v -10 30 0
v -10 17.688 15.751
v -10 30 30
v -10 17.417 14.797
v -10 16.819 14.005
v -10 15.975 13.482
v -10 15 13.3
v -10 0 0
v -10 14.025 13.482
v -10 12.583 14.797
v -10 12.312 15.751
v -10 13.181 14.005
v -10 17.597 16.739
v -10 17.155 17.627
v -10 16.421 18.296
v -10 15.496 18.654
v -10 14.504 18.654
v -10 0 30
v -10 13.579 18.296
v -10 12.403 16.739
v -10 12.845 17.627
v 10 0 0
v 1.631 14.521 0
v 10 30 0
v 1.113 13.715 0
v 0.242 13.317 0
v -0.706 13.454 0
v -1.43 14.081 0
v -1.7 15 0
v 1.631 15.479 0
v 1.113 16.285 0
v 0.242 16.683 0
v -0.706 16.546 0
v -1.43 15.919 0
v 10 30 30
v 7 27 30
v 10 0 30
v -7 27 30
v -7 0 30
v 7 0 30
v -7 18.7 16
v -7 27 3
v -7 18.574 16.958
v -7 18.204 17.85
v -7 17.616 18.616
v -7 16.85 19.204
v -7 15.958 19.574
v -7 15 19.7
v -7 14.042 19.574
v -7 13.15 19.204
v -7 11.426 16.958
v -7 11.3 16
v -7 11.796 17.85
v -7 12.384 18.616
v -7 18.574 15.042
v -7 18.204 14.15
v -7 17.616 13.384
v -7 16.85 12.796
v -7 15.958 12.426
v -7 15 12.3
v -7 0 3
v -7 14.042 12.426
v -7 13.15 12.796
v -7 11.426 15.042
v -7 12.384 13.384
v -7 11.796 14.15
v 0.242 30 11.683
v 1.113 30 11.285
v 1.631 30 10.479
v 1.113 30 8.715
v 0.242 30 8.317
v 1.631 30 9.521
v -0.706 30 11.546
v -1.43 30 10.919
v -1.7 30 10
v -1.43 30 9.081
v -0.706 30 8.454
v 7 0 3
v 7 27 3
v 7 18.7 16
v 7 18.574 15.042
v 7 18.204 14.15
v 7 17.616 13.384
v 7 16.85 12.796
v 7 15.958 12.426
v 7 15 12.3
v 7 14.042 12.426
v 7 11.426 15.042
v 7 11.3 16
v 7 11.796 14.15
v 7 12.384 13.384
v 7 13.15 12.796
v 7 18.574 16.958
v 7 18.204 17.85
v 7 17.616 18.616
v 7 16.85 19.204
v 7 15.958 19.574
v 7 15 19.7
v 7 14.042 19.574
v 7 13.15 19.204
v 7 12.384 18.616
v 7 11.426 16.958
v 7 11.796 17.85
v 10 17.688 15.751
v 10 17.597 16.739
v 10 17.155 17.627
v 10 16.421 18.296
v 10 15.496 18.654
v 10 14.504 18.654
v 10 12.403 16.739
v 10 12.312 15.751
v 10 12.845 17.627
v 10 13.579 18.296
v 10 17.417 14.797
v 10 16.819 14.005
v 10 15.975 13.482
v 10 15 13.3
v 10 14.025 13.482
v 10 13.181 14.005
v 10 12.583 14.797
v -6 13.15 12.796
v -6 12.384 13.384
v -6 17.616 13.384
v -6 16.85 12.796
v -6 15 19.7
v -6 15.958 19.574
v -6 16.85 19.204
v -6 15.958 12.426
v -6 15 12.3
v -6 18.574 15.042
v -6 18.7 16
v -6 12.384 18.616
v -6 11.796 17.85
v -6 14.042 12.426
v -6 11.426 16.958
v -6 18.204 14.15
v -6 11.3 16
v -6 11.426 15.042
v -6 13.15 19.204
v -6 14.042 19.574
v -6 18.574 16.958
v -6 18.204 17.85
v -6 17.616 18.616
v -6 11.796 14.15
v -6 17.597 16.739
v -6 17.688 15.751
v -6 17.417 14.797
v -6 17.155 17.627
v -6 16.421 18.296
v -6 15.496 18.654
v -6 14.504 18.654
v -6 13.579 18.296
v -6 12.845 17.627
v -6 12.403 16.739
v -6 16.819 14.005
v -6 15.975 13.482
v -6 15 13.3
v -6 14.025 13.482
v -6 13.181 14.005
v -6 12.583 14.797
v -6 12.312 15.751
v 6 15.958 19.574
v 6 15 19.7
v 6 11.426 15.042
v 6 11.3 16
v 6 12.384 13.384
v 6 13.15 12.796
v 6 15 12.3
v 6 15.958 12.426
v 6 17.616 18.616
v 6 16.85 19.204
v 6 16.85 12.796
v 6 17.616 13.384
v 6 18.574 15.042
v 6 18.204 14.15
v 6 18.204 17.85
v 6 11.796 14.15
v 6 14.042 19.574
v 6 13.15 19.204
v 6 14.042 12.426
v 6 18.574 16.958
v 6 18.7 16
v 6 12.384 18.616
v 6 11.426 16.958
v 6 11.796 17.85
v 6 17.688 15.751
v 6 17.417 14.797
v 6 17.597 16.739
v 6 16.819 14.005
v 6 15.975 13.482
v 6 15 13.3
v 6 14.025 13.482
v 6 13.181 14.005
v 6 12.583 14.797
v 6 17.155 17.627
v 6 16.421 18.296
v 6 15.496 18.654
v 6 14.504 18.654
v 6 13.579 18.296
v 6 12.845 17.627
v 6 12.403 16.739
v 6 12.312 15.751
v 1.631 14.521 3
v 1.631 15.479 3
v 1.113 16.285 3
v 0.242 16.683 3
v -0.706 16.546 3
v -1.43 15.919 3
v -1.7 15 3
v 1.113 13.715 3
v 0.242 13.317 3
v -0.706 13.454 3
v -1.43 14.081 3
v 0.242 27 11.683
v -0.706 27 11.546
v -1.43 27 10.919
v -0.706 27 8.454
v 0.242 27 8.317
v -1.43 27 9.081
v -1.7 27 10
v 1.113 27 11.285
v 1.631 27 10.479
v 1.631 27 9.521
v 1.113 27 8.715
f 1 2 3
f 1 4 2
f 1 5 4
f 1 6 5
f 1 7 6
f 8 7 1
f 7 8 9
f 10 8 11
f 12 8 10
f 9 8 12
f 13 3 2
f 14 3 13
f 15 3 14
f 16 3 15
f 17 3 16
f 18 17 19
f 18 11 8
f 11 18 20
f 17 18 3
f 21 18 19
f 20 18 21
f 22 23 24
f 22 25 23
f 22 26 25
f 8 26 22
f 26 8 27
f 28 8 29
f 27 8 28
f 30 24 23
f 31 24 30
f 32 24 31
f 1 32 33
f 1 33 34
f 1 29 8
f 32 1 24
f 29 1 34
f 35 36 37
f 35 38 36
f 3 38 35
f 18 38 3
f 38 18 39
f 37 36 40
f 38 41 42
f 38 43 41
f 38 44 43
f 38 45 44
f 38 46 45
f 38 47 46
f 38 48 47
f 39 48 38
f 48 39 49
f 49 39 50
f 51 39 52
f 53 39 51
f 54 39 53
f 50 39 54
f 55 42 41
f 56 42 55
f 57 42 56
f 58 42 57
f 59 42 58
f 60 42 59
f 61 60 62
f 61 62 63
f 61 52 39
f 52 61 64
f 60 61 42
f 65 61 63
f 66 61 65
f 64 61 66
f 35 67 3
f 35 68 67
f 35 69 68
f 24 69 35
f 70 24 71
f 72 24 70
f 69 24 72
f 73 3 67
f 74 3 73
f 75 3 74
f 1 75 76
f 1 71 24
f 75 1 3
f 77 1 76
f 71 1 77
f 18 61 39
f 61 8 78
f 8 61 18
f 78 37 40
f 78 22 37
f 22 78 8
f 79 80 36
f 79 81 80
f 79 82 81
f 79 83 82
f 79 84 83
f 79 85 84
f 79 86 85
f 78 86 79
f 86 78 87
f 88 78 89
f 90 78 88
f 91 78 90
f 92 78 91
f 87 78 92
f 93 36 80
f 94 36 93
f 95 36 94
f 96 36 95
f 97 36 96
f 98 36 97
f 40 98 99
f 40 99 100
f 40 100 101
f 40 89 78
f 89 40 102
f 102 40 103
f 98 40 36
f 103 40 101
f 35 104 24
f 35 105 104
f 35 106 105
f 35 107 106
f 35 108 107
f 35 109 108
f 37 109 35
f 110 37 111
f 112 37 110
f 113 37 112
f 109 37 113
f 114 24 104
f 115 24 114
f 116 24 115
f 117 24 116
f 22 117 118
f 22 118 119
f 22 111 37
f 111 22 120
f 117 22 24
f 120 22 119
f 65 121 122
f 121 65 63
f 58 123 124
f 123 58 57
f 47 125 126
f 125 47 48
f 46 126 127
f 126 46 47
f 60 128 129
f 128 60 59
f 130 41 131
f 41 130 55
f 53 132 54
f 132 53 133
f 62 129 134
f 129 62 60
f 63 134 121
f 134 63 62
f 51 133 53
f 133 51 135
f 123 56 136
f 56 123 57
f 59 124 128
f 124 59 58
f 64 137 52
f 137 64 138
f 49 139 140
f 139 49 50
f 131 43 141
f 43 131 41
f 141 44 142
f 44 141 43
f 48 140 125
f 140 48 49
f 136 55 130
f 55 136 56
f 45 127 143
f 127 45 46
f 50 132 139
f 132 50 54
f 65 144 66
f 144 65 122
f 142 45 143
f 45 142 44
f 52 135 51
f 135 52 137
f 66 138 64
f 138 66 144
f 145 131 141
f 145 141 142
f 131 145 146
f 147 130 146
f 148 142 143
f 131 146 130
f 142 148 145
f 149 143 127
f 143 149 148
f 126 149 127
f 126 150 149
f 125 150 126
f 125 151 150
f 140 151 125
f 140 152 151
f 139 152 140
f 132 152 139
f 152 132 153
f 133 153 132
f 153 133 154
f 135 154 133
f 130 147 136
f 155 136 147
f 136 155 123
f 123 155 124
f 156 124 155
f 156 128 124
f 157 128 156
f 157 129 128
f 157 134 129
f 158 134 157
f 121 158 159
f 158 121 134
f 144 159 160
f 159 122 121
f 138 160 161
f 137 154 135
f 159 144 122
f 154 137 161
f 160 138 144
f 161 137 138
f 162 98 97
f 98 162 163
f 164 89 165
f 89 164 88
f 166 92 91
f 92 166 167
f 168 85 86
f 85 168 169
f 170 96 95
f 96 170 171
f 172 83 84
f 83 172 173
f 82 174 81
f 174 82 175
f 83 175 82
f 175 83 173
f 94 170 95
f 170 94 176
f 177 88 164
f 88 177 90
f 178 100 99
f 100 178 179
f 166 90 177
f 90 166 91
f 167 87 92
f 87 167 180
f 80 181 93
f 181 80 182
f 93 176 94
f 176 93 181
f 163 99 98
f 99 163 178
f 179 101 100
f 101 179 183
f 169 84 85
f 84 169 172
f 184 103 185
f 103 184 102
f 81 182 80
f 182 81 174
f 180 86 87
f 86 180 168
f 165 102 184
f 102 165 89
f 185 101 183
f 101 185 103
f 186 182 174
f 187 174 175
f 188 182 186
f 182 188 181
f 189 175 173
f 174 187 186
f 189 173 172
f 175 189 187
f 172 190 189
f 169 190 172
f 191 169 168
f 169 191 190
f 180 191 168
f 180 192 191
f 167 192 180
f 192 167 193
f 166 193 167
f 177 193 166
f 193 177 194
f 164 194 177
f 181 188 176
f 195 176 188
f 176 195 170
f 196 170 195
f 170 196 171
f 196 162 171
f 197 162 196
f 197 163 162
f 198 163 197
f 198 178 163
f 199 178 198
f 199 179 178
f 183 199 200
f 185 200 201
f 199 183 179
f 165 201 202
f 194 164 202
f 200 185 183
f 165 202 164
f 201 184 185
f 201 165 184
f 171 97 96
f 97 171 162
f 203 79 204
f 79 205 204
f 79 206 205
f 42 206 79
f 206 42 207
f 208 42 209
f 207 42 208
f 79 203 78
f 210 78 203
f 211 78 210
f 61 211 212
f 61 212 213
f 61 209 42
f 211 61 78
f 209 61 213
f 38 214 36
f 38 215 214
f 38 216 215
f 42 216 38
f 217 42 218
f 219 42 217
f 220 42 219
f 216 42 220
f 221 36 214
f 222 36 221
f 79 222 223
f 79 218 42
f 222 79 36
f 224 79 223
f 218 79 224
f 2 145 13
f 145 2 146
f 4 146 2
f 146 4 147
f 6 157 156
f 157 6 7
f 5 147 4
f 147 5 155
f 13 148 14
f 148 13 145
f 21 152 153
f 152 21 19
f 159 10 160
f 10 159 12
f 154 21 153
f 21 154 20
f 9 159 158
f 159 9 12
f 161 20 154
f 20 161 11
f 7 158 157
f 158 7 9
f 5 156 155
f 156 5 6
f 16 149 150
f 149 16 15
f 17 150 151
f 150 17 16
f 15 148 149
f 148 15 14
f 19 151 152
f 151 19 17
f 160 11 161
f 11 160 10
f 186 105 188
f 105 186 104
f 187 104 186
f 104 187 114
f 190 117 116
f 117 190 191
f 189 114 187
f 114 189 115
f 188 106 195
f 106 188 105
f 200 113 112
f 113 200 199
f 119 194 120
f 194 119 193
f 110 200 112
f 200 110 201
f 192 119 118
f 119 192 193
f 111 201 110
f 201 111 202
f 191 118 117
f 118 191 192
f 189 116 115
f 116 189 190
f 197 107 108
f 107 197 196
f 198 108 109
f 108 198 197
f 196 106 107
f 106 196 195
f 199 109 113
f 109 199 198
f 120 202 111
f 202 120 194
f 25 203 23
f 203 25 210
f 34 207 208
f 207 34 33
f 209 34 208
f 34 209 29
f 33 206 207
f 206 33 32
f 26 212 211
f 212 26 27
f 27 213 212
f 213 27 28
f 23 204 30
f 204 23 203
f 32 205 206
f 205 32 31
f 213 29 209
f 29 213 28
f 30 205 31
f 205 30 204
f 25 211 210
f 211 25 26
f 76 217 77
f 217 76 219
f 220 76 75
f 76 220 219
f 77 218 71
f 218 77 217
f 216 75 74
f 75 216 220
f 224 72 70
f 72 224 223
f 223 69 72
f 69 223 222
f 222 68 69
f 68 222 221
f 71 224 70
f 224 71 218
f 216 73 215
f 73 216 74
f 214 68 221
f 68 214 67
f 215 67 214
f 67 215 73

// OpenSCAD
// file: beltclamp.scad
// PRUSA Mendel  
// Belt clamp
// GNU GPL v3
// Josef Průša
// josefprusa@me.com
// prusadjs.cz
// http://www.reprap.org/wiki/Prusa_Mendel
// http://github.com/prusajr/PrusaMendel
//
// modified by neurofun

include<config.scad>;

module beltclamp(clamp_length=32){

clamp_height = 3;
clamp_width = 9;
belt_pitch = 2;
belt_width = 6.5;
tooth_width = 1.3;
tooth_heigth = .75;
offset = belt_pitch/4;
// uncomment next line for a symetric clamp
//offset = 0;

	difference(){
		// basic shape
		union(0){
			translate(v = [0,0,clamp_height/2]) cube([clamp_length,clamp_width,clamp_height], center=true);
			translate(v = [-clamp_length/2, 0, 0]) cylinder(r=clamp_width/2,h=clamp_height);
			translate(v = [clamp_length/2, 0, 0]) cylinder(r=clamp_width/2,h=clamp_height);
			}
		// screw holes
		translate(v = [-clamp_length/2, 0, -1])cylinder(r=3/2+play*2, h=clamp_height+2,$fn=20);
		translate(v = [ clamp_length/2, 0, -1])cylinder(r=3/2+play*2, h=clamp_height+2,$fn=20);
		// belt grip
		translate(v = [0,offset,clamp_height-tooth_heigth])
		for ( i = [round(-clamp_width/belt_pitch/2) : round(clamp_width/belt_pitch/2)]){
			translate(v = [0,belt_pitch*i,tooth_heigth])cube(size = [belt_width, tooth_width, tooth_heigth*2], center = true);
		}
	}

}

beltclamp();
// file: spacer.scad
include <config.scad>;

module spacer(od,id,h)
{
    difference()
    {
        cylinder(h=h,d=od,center=true);
        cylinder(h=h+2,d=id,center=true);
    }
}


spacer(7,5+2*play,(20+4-8.8)/2); 
translate([0,0,-0.8/2])
    spacer(10,5+2*play,(20+4-8.8)/2-0.8); 
// file: roller.scad
include <config.scad>;


module roller()
{
    difference()
    {
        union()
        {
            resize([19,19,6])
                sphere(d=1);
            translate([0,0,-3])
                cylinder(h=10,d=8);
        }
        translate([0,0,-4])
            cylinder(h=12,d=5);
    }
}

module vroller()
{
    color([0.3,0.3,0.3,1])
    difference()
    {
        union()
        {
            rotate_extrude(convexity =100)
            {
                translate([0,-5.78/2])
                    square([15.23/2,5.78]);

                translate([0,-8.8/2])
                    square([12.21/2,8.8]);
                
                translate([12.21/2,-8.8/2])
                rotate([0,0,45])
                    square([sqrt(pow((8.8-5.78)/2,2)
                        +pow((8.8-5.78)/2,2)),3]);
                translate([15.23/2,5.78/2])
                rotate([0,0,180-45])
                    square([sqrt(pow((8.8-5.78)/2,2)
                        +pow((8.8-5.78)/2,2)),3]);
            }
            
            cylinder(h=9,d=10,center=true);
        }

        cylinder(h=10.8,d=5,center=true);
    }
}


vroller();
// file: corner.scad
include<config.scad>

module corner(h1=10,h2=10,d1=3+play,d2=3+play,s1=0,s2=0,)
{
    translate([0,-h1-s1,-h2-s2])
    difference()
    {
        union()
        {
            translate([-10,0,0])
            {
                cube([20,h1*2,3]);
                cube([20,3,h2*2]);
            }
            
            for(d=[1,-1])
            translate([-3/2+d*(10-3/2),0,0])
                cube([3,h1*2,h2*2]);
        }
        
        translate([-11,h1*2,0])
        rotate([atan(h1/h2),0,0])
            cube([22,sqrt(h1*h1+h2*h2),sqrt(h1*h1+h2*h2)*2]);
        
        //hole
        translate([0,h1+s1,-1])
            cylinder(h=5,d=d1);
        translate([0,4,h2+s2])
        rotate([90,0,0])
            cylinder(h=5,d=d2);
    }    
}

module corner2()
{
    translate([0,-10,0])
    rotate([0,0,180])
    translate([0,10,10])
        corner();
    translate([0,10,0])
    translate([0,10,10])
        corner();
}


corner();
// file: rpvxy.scad
include <config.scad>;
use <corner.scad>;
use <roller.scad>;
use <slot.scad>;
use <spacer.scad>;
use <nema.scad>;
use <beltclamp.scad>;

d_roller=(31.9+31)/2;


module rpvxy_plate()
{
    difference()
    {
        union()
        {
            translate([0,+27/2,-34-3/2])
                cube([d_roller+20,60+27,3],center=true);
        }
        
        for(dx=[1,-1])
        for(dy=[1,-1])
        translate([dx*d_roller/2,dy*(60+27-20)/2+27/2,-34-4])
            cylinder(h=5,d=3+play);
        for(d=[1,-1])
        translate([d*32/2,+27/2,-34-4])
            cylinder(h=5,d=3+play);

        for(dx=[1,-1])
        for(dy=[1,-1])
        translate([dx*32/2,dy*27/2+27/2,-34-4])
            cylinder(h=5,d=6+play);
    }    
}

module rpvxy_joiner()
{
    difference()
    {
        union()
        {
            translate([0,+27/2,-10-3/2])
                cube([9,27+20,3],center=true);
            
            translate([0,27/2,-10-(20+4-8.8)/2])
                cylinder(h=(20+4-8.8)/2,d=7);
        }
        
        for(dy=[0,27])
        translate([0,dy,-10-4])
            cylinder(h=5,d=3+play);

        translate([0,+27/2,-10-10])
            cylinder(h=11,d=3+play);
    }    
}


//Roller + corner
module rpvxy(motor=true,debug=false,print=false)
rotate([0,print?(motor?1:-1)*90:0,0])
{
    if(print==false)
    for(d1=[1,-1])
    for(d2=[1,-1,0])
    translate([d1*d_roller/2,d2*(60+27-20)/2+27/2,-20-2])
    {
        if(d2==-1)
        translate([0,0,22])
        rotate([0,0,-90*d2+90])
            corner(h1=10,h2=10,
                d1=3+play,d2=3+play);
        
        for(d=[1,-1])
        if(d2!=0 || d!=1)
        translate([0,0,d*(8.8/2+(20+4-8.8)/4)])
            spacer(7,3+play,(20+4-8.8)/2);
        vroller();
    }
    
    //Motor/Bearing holder:
    difference()
    {
        union()
        {
            translate([-(d_roller+20)/2,10+27,-10])
                cube([d_roller+20,20,3]);
            translate([-(d_roller+20)/2,10+27,-10])
                cube([d_roller+20,3,20]);
            translate([(motor?1:-1)*(d_roller+20-3)/2,10+20/2+27,0])
                cube([3,20,20],center=true);
            translate([-(d_roller+20)/2,-10,10])
                cube([d_roller+20,75+(motor?20:-8),7]);
            for(d=[0,10])
            if(motor==false)
                translate([0,26+27,-10+1.5])
                    cylinder(h=20,r=6/2+play);	
        }
        
        //Nema Mount
        translate([0,26+27,0])
        {

            if(motor)
            translate([0,0,10])
            {
                translate([0,0,-1])
                cylinder(h=9,r=nema23_id/2);	
                translate([0,0,-20-1])  
                {
                    cylinder(h=5,r=13/2);	
                    rotate([0,0,90])
                    translate([0,-13/2,0])
                        cube([13/2+1,13,5]);
                }
                dd=nema23_screw_d/2;
                for(d=[[dd,dd],[-dd,-dd],[dd,-dd],[-dd,dd]])
                translate([d[0],d[1],0])
                {
                    translate([0,0,-1])
                        cylinder(h=8+2,r=5/2+play);
                    translate([0,0,-5+M5_nut_h])
                        cylinder(h=1+M5_nut_h,r=M5_nut_d/2,$fn=6);
                } 
            }        
            if(motor==false)
            {
                translate([0,0,-10-1])
                    cylinder(h=31,r=3/2+play);	
                translate([0,0,0])
                    cube([11,11,11],center=true);
            }
        }
        //roller mount
        for(d=[1,-1])
        translate([d*d_roller/2,20+27,-10-1])
            cylinder(h=5,r=(3+play)/2);
        
        
        //holder Mounts
        for(dx=[1,-1])
        for(dy=[0,27])
        translate([dx*d_roller/2,dy,10-1]){
            cylinder(h=9,r=(3+play)/2);
            translate([0,0,6])
                cylinder(h=3,r=8/2);
        }
        for(d=[1,-1])
        translate([d*d_roller/2,10-1+27,0])
        rotate([270,0,0])
            cylinder(h=5,r=(3+play)/2);
                
    }
    
    if(print==false)
        rpvxy_plate();
    
    if(print==false)
    for(x=[-d_roller/2,d_roller/2])
    translate([x,0,0])
        rpvxy_joiner();
    
    if(debug)
    {
        translate([(motor?-1:1)*23,0,0])
        rotate([0,90,0])
        {
            vslot(100);
            translate([0,27,0])
                vslot(100);
        }
        translate([0,0,-20-2])
        rotate([90,0,0])
            vslot(100);
        
        if(motor)
        translate([0,26+27,17])
        rotate([-180,0,0])
        {
            nema23(3,[true,false,true,false]);
            translate([0,0,12])
            rotate([180,0,0])
                narrow_pulley(5, 18, 8, 22, 1.8, 12, 18);
        }
        
    }
}


rpvxy(true,true,false);

*rotate([180,0,0])
rpvxy_joiner();

*rpvxy_plate();

*rpvxy(false,false,true);
// file: nema.scad
include <config.scad>;

module narrow_pulley(bore_diameter, outside_diameter, width,
           flange_diameter, flange_width,
           hub_diameter, hub_width) {
  color(aluminum)
  difference() {
    union() {
      cylinder(r=outside_diameter/2, h=width+2*flange_width,
           center=true);
      // Flanges
      translate([0, 0, (width+flange_width)/2])
        cylinder(r=flange_diameter/2, h=flange_width, center=true);
      translate([0, 0, -(width+flange_width)/2])
        cylinder(r=flange_diameter/2, h=flange_width, center=true);
      translate([0, 0, 0.75*flange_width-hub_width/2])
        cylinder(r=hub_diameter/2,
             h=hub_width-width-1.5*flange_width,
             center=true);
    }
    // Bore
    cylinder(r=bore_diameter/2, h=2*hub_width, center=true);
  }
}

module nema17(screw_l=5,screws=[true,true,true,true]) {
  color([0.4, 0.4, 0.4]) 
  {
  translate([0, -nema17_l/2, 0])
  intersection() {
      cube([nema17_od, nema17_l, nema17_od], center=true);
      rotate([0, 45, 0]) cube([nema17_od*sqrt(2)-5, nema17_l, nema17_od*sqrt(2)-5], center=true);
  }
  translate([0, 2, 0]) rotate([90, 0, 0])
      cylinder(r=nema17_id/2, h=2+1);
  }
  color(steel)
  translate([0, -nema17_l/2+10, 0]) rotate([90, 0, 0])
    cylinder(r=2.5, h=nema17_l+21, center=true);
  translate([0,screw_l+4,0])
  for (a = [0, 90, 180, 270]) 
  	if(screws[a/90])
	rotate([0, a, 0]) {
    color([0.2, 0.2, 0.2]) translate([nema17_screw_d/2, 0, nema17_screw_d/2])
      rotate([90, 0, 0]) {
      translate([0, 0, 0]) cylinder(r=2.5, h=4);
      translate([0, 0, 0]) cylinder(r=1.5, h=screw_l+10);
    }
    color(steel) translate([nema17_screw_d/2, -3.5, nema17_screw_d/2])
      rotate([90, 0, 0]) cylinder(r=5, h=0.5);
  }
}

module nema17smale(screw_l=3,screws=[true,true,true,true]) {
  color([0.4, 0.4, 0.4]) 
  {
      translate([0, -40/2, 0])
      intersection() 
      {
          cube([nema17_od, 40, nema17_od], center=true);

          rotate([0, 45, 0]) 
            cube([nema17_od*sqrt(2)-5, 40, nema17_od*sqrt(2)-5], center=true);
      }
      translate([0, 2, 0]) rotate([90, 0, 0])
          cylinder(r=nema17_id/2, h=2+1);
  }

  color(steel)
  translate([0, -40/2-9+21.5, 0]) rotate([90, 0, 0])
    cylinder(r=2.5, h=40+21, center=true);

  translate([0,screw_l+4,0])
  for (a = [0, 90, 180, 270]) 
  	if(screws[a/90])
	rotate([0, a, 0]) {
    color([0.2, 0.2, 0.2]) translate([nema17_screw_d/2, 0, nema17_screw_d/2])
      rotate([90, 0, 0]) {
      translate([0, 0, 0]) cylinder(r=2.5, h=4);
      translate([0, 0, 0]) cylinder(r=1.5, h=screw_l+10);
    }
    color(steel) translate([nema17_screw_d/2, -3.5, nema17_screw_d/2])
      rotate([90, 0, 0]) cylinder(r=5, h=0.5);
  }
}

module nema23(has_back, is_cylinder){
  mplate = 56.9; //mounting plate width
  mplateH = 5; //mounting plate height

  ringR = 38.10 / 2; //ring radius
  ringH = 1.5; //ring thickness

  shaftR = 6.337/2; //shaft radius
  shaftH = 19;  //shaft lenght

  bodyL = 56.1; //46.5, 56.1, 77.7, 103.1, ...
  bodyInnerCube = 37.6;

  holeR = 5.21/2;
  holeL = 47.14/2; //distance between hole centres

  translate([0,0,-mplateH/2])
  difference(){
    union(){
      //mounting plate
      color([0.7,0.7,0.7]) cube(size = [mplate,mplate,mplateH], center = true);
      //ring
      color([0.7,0.7,0.7]) translate(v=[0,0,mplateH/2+ringH/2]) cylinder(r=ringR, h=ringH, center=true);
      //shaft front
      color([0.9,0.9,0.9]) translate(v=[0,0,mplateH/2+ringH+shaftH/2])cylinder(r=shaftR, h=shaftH, center=true);
      if (has_back == 1){
        color([0.9,0.9,0.9])  translate(v=[0,0,0-bodyL-shaftH/2]) cylinder(r=shaftR, h=shaftH, center=true);
      }
      //body
      if (is_cylinder == 1){
        color([0.1,0.1,0.1]) translate(v=[0,0,0-mplateH/2-bodyL/2]) cylinder(r=mplate/2, h=bodyL, center=true);
      }else{
        union(){
          color([0.1,0.1,0.1]) translate(v=[0,0,0-mplateH/2-bodyL/2]) cube(size = [bodyInnerCube, mplate, bodyL], center=true);
          color([0.1,0.1,0.1]) translate(v=[0,0,0-mplateH/2-bodyL/2]) cube(size = [mplate,bodyInnerCube, bodyL], center=true);
        }
      }
    }
    translate(v=[holeL,holeL,0]) cylinder(r = holeR, h = 2*mplateH, center=true);
    translate(v=[-holeL,holeL,0]) cylinder(r = holeR, h = 2*mplateH, center=true);
    translate(v=[-holeL,-holeL,0]) cylinder(r = holeR, h = 2*mplateH, center=true);
    translate(v=[holeL,-holeL,0]) cylinder(r = holeR, h = 2*mplateH, center=true);
  }
  
}

nema23();
// file: slot.scad
include<config.scad>;

//Vlost
module vslot(h,a=1)
{
    color(aluminum,a)
    translate([0,0,-h/2])
    difference()
    {
        union()
        {
            for(r=[0,90,180,270])
            rotate([0,0,r])    
            {
                translate([10-1.8/2,10-1.8/2,0])
                    cylinder(h=h,d=1.8);
                translate([10-1.8,-10+1.8/2,0])
                    cube([1.8,20-1.8,h]);
            }

            for(r=[0,90])
            rotate([0,0,45+r])    
            translate([-(sqrt(20*20+20*20)-1.8)/2,-1.8/2,0])
                cube([sqrt(20*20+20*20)-1.8,1.8,h]);

            translate([-3,-3,0])
                cube([6,6,h]);
        }
        translate([0,0,-1])
            cylinder(h=h+2,d=4.2);
        

        for(r=[0,90,180,270])
        rotate([0,0,r])    
        translate([0,10-1.8-5.58/2,0])
        rotate([0,0,45])    
        translate([0,0,-1])
            cube([10,10,h+2]);
        
    }
}

module tslot(h,a=1)
{
    color(aluminum,a)
    difference()
    {
        cube([40,40,h],center=true);
        
        for(a=[0,90,180,270])
        rotate([0,0,a])
        translate([0,20,0])
            cube([11,20,h+2],center=true);
    }
}

tslot(5);
// file: config.scad
//General Settings
play=0.2; //to make fittings (add to some holes if nessesary)
//circle resolution 
$fa = 3;
$fs = 1;//0.5;

aluminum = [0.9, 0.9, 0.9];
steel = [0.8, 0.8, 0.9];
wood="BurlyWood";

//ISO/DIN Parts 
//Kugellager
kugellager_d=5+play;
kugellager_h=2.5+play;

//Mutter M2
M2_nut_d=4.38+2*play;
M2_nut_w=4+2*play;
M2_nut_h=1.6+2*play;

//Mutter M3
M3_nut_d=6.01+2*play;
M3_nut_w=5.5+2*play;
M3_nut_h=2.4+2*play;

//Mutter M4
M4_nut_d=7.66+2*play;
M4_nut_w=7+2*play;
M4_nut_h=3.2+2*play;

//Mutter M5
M5_nut_d=9.23+2*play;
M5_nut_w=8+2*play;
M5_nut_h=4+2*play;


//Mutter M8
M8_nut_d=14.38+2*play;
M8_nut_w=13+2*play;
M8_nut_h=6.8+2*play;

//LMXXUU Linear Ball Bearing
LMXXUU_d=19;
LMXXUU_l=29;

//Pully 2.5
band_w=5;
band_b=2;
band_outer_d=13;
//Ballbearing opposit for pully
band_bb_id=5;
band_bb_od=11;
band_bb_w=4;

//Bearing
B608Z_od=22+2*play;
B608Z_id=8+2*play;
B608Z_isd=13;
B608Z_h=7;

//Nema17
nema17_od=42.3;
nema17_id=22+2*play;
nema17_screw_d=31;
nema17_l=48;

//Nema17
nema23_id=38.1+2*play;
nema23_screw_d=47.14;
// main file
include <config.scad>;
use <slot.scad>;
use <nema.scad>;
use <rpvxy.scad>;


module nemaholder(mirror=false,debug=false)
{
    dside=mirror?-60:-3;
    difference()
    {
        union()
        {
            translate([10,-60,-65+20])
                cube([3+4,60,65]);

            translate([-10,dside,-45])
                cube([20+1,3,45]);
        }
        
        //nema 23:
        translate([10+3+4,-30,-16])
        rotate([0,-90,0])
        translate([0,0,-1])
        {
            h=3+4;
            cylinder(h=h+2,r=nema23_id/2);	
            dd=nema23_screw_d/2;
            for(d=[[dd,dd],[-dd,-dd],[dd,-dd],[-dd,dd]])
            translate([d[0],d[1],0])
            {
                cylinder(h=h+2,r=5/2+play);
                translate([0,0,h+1-M5_nut_h])
                    cylinder(h=M5_nut_h+5,r=M5_nut_d/2,$fn=6);
            } 
        }
        
        //mount holse
        translate([0,dside+4,-10])
        rotate([90,0,0])
            cylinder(h=3+2,r=3/2+play);
        for(d=[1,-1])
        translate([10-1,-30+d*15,10])
        rotate([0,90,0])
        {
            cylinder(h=4+3+2,r=3/2+play);
            translate([0,0,5])
                cylinder(h=3+1,r=8/2+play);
        }
    }


    if(debug)
    {
        translate([10+3+4,-30,-16])
        rotate([0,-90,0])
        {
            nema23();
            translate([0,0,17])
            narrow_pulley(5, 18, 8, 22, 1.8, 12, 18);
        }
    }
}


module nemaholder_bearing(mirror=false,debug=false)
{
    dside=mirror?30-3:0;
    difference()
    {
        union()
        {
            for(d=[1,-1])
            translate([-3/2+d*(10-3/2),0,-30])
                cube([3,30,30]);
            translate([-10,0,-3])
                cube([20,30,3]);
            translate([-10,dside,-30])
                cube([20,3,30]);
            for(d=[1,-1])
            translate([d*(10-3/2-1/2),15,-16])
            rotate([0,-90,0])
                cylinder(h=3+1,r=7/2+play,center=true);	
        }
        
        //bearing hole:
        for(d=[1,-1])
        translate([d*(10-3/2),15,-16])
        rotate([0,-90,0])
            cylinder(h=3+4,r=5/2+play,center=true);	
        //mount holse
        translate([0,4+dside,-10])
        rotate([90,0,0])
            cylinder(h=3+2,r=3/2+play);
        for(d=[1,-1])
        translate([0,15,-4])
        {
            cylinder(h=3+2,r=3/2+play);
        }

        
    }   
    
    
    if(debug)
    {
        translate([10+3+4,15,-16])
        rotate([0,-90,0])
        {
            translate([0,0,17])
            narrow_pulley(5, 18, 8, 22, 1, 10, 10);
        }
            
    }    
}

*translate()
{
    translate([0,100,0])
        nemaholder(false,true);

    translate([0,-100,0])
        nemaholder_bearing(false,true);

    translate([0,-20,32])
    {
        //Roller + corner
        rpvxy(false);

        //Tslots
        for(d=[1,-1])
        translate([130,d*110,-22-20])
        rotate([0,90,0])
            vslot(300,0.5);

        //vslots querstange
        translate([0,0,-22])
        rotate([90,0,0])
            vslot(240,0.5);
        translate([100,0,0])
        rotate([0,90,0])
            vslot(260,0.5);
    }
}

*rotate([0,90,0])
    nemaholder(true);

rotate([0,180,0])
    nemaholder_bearing(true);
